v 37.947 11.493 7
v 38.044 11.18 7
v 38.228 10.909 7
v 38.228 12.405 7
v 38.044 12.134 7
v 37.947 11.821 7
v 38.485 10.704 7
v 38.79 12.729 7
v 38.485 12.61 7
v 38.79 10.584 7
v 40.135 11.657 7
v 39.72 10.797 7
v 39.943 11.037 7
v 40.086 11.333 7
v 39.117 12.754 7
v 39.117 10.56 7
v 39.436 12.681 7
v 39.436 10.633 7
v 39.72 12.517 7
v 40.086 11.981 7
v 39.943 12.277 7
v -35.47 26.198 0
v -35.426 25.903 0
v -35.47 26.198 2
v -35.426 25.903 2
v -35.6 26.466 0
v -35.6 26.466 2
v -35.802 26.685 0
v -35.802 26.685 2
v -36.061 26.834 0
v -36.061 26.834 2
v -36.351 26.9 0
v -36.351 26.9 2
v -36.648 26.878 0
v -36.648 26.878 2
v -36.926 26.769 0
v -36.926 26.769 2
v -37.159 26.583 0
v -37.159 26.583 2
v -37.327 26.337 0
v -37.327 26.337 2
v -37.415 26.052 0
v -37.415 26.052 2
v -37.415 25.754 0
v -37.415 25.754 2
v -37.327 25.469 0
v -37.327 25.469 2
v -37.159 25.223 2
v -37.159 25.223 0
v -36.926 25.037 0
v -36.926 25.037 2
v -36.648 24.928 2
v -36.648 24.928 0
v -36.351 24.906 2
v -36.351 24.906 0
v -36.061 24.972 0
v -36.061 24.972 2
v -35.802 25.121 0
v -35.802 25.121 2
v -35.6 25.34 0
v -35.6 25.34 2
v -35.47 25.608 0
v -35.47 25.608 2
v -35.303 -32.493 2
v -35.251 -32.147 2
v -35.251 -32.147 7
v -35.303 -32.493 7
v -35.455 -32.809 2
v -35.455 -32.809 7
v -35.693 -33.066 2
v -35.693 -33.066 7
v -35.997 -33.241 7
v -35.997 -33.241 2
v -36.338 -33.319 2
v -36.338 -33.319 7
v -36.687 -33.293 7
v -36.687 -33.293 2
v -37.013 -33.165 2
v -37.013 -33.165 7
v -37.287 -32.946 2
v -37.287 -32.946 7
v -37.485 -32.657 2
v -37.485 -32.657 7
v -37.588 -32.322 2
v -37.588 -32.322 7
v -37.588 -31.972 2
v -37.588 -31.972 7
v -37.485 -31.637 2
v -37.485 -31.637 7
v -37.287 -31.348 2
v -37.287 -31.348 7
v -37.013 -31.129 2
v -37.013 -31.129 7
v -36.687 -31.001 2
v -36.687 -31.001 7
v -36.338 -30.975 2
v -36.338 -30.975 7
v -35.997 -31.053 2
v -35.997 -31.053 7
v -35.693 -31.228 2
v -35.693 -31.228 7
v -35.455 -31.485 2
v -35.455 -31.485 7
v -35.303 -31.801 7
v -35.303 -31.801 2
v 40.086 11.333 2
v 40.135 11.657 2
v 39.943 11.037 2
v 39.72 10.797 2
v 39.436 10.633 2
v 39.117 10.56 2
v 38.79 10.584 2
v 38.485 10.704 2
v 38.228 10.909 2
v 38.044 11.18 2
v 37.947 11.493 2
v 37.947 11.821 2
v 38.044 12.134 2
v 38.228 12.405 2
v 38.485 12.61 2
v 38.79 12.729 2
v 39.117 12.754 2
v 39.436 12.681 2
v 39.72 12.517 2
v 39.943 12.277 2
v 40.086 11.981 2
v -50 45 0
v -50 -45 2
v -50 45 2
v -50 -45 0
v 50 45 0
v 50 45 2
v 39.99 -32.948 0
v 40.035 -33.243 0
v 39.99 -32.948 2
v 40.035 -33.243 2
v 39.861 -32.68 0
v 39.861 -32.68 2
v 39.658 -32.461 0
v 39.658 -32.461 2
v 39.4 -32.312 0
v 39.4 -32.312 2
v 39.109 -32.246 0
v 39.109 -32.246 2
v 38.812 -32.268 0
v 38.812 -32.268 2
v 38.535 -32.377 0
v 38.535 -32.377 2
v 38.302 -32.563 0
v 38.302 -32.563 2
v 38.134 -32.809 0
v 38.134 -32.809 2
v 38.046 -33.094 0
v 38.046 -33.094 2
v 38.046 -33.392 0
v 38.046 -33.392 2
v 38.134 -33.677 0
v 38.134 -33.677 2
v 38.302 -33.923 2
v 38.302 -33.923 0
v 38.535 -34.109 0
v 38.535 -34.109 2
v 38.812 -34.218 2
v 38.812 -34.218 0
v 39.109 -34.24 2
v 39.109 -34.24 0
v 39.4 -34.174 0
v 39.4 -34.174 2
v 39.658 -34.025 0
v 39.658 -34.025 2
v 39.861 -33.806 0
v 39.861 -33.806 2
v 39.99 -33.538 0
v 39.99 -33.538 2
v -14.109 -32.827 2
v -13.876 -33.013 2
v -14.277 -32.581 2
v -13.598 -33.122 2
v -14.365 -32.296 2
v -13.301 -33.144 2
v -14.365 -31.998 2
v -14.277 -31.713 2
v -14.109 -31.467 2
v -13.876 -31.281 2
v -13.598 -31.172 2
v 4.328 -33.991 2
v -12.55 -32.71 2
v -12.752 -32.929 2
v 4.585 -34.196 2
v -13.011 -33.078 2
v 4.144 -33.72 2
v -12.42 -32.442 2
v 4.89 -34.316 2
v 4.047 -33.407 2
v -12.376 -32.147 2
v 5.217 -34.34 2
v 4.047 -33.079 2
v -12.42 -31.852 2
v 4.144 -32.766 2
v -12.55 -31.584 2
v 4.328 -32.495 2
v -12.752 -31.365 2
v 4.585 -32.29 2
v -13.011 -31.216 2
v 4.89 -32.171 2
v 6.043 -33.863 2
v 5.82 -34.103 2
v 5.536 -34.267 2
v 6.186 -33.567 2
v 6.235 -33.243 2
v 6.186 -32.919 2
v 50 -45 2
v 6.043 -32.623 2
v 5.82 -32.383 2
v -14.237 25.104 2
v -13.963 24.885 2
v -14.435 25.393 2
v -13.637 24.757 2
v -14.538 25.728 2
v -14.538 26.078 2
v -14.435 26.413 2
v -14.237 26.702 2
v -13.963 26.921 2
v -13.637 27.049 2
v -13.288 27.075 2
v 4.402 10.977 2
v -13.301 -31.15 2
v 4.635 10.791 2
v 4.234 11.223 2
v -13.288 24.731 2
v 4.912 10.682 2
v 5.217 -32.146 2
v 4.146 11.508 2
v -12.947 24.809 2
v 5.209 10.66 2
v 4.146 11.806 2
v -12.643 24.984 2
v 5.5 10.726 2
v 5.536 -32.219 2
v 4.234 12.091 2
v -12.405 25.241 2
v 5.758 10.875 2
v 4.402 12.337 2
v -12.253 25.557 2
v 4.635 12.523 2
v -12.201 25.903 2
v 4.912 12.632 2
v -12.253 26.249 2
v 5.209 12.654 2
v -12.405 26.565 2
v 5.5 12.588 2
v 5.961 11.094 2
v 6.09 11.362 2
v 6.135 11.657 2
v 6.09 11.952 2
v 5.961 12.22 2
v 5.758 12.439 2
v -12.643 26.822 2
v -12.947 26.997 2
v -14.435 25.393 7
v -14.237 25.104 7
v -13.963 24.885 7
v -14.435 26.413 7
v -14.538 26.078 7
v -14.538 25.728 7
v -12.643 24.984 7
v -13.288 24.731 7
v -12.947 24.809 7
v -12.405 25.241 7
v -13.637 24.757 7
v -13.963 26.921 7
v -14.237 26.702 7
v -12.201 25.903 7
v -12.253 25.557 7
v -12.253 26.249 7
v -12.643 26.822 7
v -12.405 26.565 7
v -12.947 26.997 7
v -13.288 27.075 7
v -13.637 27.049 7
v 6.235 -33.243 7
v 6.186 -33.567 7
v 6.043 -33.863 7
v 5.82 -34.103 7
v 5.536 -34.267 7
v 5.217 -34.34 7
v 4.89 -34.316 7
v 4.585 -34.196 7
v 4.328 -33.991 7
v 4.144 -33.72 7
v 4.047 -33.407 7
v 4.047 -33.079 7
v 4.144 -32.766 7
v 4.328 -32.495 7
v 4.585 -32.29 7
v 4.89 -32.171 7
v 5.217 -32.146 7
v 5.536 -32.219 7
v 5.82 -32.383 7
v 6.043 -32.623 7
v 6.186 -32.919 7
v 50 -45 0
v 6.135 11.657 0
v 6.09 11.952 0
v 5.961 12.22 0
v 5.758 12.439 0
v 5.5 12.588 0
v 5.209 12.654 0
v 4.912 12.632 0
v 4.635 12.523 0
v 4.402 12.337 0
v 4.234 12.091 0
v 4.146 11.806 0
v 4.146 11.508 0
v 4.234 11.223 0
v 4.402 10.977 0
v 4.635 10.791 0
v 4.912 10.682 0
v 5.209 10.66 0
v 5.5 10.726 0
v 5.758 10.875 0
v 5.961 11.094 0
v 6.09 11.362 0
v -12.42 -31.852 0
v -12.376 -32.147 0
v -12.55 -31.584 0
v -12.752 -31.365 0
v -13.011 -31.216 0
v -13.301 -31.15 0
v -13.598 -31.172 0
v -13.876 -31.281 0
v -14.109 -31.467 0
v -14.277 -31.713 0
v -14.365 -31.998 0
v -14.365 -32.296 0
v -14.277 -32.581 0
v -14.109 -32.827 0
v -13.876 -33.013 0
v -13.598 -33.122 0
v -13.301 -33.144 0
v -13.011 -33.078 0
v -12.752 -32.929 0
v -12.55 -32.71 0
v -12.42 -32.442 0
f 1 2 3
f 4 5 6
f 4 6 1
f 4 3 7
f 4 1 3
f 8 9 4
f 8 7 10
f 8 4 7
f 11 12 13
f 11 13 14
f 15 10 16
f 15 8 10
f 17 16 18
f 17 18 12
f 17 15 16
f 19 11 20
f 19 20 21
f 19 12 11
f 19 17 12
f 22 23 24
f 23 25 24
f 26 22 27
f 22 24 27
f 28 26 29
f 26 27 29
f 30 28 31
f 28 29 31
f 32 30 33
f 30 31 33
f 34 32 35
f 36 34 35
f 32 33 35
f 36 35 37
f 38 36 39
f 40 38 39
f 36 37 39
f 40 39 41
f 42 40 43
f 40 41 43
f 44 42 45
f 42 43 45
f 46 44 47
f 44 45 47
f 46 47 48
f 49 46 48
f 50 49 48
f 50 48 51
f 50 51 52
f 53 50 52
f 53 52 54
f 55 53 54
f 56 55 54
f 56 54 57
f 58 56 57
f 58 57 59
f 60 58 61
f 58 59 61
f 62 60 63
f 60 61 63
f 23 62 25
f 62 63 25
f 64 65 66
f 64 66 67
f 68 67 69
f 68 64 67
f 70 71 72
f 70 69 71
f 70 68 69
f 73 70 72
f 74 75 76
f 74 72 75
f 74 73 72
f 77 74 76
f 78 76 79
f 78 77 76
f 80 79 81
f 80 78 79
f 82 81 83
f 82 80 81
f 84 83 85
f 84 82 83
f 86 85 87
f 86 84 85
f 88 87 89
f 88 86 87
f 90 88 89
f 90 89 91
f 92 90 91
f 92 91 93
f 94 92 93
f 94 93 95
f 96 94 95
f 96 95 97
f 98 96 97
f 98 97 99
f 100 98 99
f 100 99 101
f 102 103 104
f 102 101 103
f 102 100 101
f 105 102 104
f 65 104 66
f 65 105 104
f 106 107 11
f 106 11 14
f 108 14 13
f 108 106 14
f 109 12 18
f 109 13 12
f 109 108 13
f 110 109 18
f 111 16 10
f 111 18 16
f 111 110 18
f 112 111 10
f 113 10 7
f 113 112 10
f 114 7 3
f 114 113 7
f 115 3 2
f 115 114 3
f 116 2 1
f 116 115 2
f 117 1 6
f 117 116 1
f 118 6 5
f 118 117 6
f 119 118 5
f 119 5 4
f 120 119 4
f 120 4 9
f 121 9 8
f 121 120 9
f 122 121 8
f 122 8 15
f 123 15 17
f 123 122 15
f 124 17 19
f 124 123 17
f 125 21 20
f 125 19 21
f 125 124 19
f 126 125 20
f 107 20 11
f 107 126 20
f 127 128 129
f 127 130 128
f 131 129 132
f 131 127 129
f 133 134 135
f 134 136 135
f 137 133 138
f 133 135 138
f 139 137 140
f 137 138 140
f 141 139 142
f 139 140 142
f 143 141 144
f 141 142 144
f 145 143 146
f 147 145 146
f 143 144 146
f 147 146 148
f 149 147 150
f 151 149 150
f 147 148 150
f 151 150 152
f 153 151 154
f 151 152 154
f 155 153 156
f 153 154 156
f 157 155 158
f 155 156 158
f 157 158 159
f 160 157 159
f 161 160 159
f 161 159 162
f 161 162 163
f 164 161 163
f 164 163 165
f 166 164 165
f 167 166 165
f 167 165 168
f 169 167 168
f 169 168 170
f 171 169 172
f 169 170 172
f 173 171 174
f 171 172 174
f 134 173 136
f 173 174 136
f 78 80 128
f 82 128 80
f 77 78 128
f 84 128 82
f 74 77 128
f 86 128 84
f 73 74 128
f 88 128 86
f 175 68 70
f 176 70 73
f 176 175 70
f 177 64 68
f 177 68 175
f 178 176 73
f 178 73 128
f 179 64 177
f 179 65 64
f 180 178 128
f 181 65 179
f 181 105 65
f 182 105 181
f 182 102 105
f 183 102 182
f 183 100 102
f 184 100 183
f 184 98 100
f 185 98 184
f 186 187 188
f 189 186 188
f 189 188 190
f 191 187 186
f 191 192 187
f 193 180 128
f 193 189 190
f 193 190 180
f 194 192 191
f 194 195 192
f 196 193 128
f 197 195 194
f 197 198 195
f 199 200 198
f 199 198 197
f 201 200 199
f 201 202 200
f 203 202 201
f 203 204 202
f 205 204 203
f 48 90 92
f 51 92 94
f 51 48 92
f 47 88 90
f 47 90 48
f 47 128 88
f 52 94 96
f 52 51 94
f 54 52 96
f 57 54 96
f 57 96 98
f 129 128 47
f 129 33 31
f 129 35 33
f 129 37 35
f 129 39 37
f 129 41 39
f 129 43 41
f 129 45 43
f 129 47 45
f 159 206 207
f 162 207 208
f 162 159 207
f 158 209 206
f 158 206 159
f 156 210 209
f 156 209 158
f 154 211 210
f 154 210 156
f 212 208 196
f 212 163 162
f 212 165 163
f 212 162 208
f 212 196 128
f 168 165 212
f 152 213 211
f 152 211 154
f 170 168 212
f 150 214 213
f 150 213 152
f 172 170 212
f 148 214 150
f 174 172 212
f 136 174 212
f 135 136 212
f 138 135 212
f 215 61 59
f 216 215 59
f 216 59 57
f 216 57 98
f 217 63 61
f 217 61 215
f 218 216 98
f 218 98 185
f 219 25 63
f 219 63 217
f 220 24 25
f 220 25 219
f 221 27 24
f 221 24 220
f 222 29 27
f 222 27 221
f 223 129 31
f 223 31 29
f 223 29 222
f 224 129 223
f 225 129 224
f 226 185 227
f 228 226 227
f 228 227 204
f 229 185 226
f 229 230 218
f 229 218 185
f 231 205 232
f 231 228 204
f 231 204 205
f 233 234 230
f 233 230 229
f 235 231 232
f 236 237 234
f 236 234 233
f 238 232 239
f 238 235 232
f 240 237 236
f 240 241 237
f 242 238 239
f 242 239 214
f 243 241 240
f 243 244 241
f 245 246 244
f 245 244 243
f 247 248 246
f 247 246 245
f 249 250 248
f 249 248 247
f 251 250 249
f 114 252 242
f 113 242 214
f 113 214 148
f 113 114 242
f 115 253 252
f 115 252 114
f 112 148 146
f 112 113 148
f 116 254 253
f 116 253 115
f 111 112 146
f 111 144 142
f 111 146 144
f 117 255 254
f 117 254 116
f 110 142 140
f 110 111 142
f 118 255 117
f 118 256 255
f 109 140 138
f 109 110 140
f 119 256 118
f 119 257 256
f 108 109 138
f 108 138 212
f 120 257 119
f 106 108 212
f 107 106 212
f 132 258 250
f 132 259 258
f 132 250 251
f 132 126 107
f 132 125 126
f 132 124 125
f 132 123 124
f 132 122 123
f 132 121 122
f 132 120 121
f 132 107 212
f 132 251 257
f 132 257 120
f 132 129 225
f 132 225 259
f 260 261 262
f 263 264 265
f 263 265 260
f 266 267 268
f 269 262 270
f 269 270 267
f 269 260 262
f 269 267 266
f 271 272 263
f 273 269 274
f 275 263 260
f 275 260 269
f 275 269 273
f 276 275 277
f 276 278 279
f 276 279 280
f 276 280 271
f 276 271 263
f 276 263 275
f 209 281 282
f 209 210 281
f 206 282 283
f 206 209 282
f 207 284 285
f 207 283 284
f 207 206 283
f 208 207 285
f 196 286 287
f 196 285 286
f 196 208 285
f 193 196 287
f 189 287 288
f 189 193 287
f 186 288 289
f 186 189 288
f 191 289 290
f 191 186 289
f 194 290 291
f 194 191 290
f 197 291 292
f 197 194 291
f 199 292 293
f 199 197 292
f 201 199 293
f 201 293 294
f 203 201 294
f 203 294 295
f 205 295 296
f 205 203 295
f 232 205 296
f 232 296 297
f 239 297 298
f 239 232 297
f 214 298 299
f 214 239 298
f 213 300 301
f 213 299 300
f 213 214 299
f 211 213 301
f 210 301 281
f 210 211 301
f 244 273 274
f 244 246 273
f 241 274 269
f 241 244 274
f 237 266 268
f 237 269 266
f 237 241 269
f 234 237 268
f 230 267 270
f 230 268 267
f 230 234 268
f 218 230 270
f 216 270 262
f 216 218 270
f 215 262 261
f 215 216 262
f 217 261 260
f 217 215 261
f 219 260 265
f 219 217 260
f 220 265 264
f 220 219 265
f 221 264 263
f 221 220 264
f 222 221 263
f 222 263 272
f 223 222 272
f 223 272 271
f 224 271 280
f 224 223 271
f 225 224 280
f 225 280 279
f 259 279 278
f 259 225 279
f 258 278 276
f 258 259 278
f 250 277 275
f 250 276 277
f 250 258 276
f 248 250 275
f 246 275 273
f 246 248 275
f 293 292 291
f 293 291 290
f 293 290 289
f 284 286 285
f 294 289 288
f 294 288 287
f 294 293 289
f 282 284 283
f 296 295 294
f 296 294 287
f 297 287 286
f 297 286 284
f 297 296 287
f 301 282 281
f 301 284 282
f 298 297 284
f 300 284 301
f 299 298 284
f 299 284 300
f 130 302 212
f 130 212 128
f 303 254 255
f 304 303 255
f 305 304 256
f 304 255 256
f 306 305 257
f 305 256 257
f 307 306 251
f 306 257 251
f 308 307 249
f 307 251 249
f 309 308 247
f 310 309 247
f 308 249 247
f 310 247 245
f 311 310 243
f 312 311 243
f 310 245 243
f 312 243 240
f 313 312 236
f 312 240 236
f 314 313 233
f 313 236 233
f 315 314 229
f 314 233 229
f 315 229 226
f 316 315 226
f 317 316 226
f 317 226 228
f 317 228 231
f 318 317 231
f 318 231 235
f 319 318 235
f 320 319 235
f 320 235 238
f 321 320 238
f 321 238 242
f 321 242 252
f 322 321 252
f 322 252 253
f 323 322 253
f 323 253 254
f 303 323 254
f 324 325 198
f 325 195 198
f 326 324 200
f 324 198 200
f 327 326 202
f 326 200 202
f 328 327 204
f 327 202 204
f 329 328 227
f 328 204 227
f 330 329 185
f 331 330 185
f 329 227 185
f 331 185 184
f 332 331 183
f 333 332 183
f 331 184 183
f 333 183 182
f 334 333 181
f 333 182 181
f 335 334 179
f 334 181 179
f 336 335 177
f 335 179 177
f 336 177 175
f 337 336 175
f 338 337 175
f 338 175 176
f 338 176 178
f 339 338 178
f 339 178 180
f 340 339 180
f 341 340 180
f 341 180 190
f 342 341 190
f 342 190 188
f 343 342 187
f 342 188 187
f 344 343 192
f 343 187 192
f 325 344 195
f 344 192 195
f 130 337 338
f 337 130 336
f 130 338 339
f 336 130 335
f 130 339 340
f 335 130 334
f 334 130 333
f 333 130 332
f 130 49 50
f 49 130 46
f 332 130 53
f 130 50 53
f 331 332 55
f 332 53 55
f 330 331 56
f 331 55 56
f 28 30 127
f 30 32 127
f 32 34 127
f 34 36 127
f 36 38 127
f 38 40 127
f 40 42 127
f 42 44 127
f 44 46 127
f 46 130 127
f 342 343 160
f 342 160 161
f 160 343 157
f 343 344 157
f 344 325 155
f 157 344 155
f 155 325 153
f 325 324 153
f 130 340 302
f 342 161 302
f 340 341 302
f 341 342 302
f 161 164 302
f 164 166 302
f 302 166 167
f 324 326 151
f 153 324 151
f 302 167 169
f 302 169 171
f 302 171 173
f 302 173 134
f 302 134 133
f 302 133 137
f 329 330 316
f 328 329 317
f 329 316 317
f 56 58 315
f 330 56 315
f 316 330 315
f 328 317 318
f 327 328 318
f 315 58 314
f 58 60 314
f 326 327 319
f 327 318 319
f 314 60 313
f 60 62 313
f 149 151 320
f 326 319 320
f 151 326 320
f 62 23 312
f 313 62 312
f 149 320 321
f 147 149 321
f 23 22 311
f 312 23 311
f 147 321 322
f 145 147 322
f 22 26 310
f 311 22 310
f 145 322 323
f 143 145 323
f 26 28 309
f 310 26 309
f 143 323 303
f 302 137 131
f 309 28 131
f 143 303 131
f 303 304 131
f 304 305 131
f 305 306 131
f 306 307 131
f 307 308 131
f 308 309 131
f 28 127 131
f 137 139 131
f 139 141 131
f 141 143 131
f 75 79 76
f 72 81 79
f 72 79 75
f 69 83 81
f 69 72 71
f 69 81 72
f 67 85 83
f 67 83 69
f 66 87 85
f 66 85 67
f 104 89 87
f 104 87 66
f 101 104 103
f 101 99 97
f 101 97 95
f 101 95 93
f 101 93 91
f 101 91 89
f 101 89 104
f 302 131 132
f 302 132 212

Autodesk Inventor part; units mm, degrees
ref_plane "YZ Plane" through (0, 0, 0) normal (1, 0, 0) x (0, 1, 0)
ref_plane "XZ Plane" through (0, 0, 0) normal (0, 1, 0) x (-1, 0, 0)
ref_plane "XY Plane" through (0, 0, 0) normal (0, 0, 1) x (1, 0, 0)
sketch "Sketch1" plane through (0, 0, 0) normal (0, 0, 1) x (1, 0, 0)
  line L0 (-50, 45) -> (50, 45)
  line L1 (50, 45) -> (50, -45)
  line L2 (50, -45) -> (-50, -45)
  line L3 (-50, -45) -> (-50, 45)
  line L4 (-50, -45) -> (50, 45) construction
  point P0 (0, 0)
  point P1 (0, 0)
  dimension "d0" = 100
  dimension "d1" = 90
extrude "Extrusion1" add sketch "Sketch1" along normal blind 2
sketch "Sketch2" plane through (0, 0, 2) normal (0, 0, 1) x (1, 0, 0)
  circle A0 centre (39.0346, -33.2431) radius 1.25 projected
  circle A1 centre (5.1346, -33.2431) radius 1.25 projected
  circle A2 centre (5.1346, 11.6569) radius 1.25 projected
  circle A3 centre (39.0346, 11.6569) radius 1.25 projected
  circle A4 centre (-13.3759, -32.147) radius 1.325 projected
  circle A5 centre (-36.4259, -32.147) radius 1.325 projected
  circle A6 centre (-13.3759, 25.903) radius 1.325 projected
  circle A7 centre (-36.4259, 25.903) radius 1.325 projected
  circle A8 centre (39.0346, -33.2431) radius 1
  circle A9 centre (5.1346, -33.2431) radius 1
  circle A10 centre (-13.3759, -32.147) radius 1
  circle A11 centre (-36.4259, -32.147) radius 1
  circle A12 centre (-13.3759, 25.903) radius 1
  circle A13 centre (-36.4259, 25.903) radius 1
  circle A14 centre (5.1346, 11.6569) radius 1
  circle A15 centre (39.0346, 11.6569) radius 1
  point P0 (0, 0)
  dimension "d4" = 2
  dimension "d5" = 2
  dimension "d6" = 2
  dimension "d7" = 2
  dimension "d8" = 2
  dimension "d9" = 2
  dimension "d10" = 2
  dimension "d11" = 2
extrude "Extrusion2" cut sketch "Sketch2" against normal blind 10 contours A8 | A10 | A13 | A14
sketch "Sketch3" plane through (0, 0, 2) normal (0, 0, 1) x (1, 0, 0)
  circle A0 centre (39.0346, 11.6569) radius 1.25 projected
  circle A1 centre (5.1346, -33.2431) radius 1.25 projected
  circle A2 centre (-36.4259, -32.147) radius 1.325 projected
  circle A3 centre (-13.3759, 25.903) radius 1.325 projected
  circle A4 centre (5.1346, -33.2431) radius 1.1
  circle A5 centre (-36.4259, -32.147) radius 1.175
  circle A6 centre (-13.3759, 25.903) radius 1.175
  circle A7 centre (39.0346, 11.6569) radius 1.1
  point P0 (0, 0)
  dimension "d14" = 0.15
  dimension "d15" = 0.15
  dimension "d16" = 0.15
  dimension "d17" = 0.15
extrude "Extrusion3" add sketch "Sketch3" along normal blind 5 contours A4 | A5 | A6 | A7
equation "\"d15\" = d14"
equation "\"d16\" = d14"
equation "\"d17\" = d14"
properties part number "Electrical Box"
